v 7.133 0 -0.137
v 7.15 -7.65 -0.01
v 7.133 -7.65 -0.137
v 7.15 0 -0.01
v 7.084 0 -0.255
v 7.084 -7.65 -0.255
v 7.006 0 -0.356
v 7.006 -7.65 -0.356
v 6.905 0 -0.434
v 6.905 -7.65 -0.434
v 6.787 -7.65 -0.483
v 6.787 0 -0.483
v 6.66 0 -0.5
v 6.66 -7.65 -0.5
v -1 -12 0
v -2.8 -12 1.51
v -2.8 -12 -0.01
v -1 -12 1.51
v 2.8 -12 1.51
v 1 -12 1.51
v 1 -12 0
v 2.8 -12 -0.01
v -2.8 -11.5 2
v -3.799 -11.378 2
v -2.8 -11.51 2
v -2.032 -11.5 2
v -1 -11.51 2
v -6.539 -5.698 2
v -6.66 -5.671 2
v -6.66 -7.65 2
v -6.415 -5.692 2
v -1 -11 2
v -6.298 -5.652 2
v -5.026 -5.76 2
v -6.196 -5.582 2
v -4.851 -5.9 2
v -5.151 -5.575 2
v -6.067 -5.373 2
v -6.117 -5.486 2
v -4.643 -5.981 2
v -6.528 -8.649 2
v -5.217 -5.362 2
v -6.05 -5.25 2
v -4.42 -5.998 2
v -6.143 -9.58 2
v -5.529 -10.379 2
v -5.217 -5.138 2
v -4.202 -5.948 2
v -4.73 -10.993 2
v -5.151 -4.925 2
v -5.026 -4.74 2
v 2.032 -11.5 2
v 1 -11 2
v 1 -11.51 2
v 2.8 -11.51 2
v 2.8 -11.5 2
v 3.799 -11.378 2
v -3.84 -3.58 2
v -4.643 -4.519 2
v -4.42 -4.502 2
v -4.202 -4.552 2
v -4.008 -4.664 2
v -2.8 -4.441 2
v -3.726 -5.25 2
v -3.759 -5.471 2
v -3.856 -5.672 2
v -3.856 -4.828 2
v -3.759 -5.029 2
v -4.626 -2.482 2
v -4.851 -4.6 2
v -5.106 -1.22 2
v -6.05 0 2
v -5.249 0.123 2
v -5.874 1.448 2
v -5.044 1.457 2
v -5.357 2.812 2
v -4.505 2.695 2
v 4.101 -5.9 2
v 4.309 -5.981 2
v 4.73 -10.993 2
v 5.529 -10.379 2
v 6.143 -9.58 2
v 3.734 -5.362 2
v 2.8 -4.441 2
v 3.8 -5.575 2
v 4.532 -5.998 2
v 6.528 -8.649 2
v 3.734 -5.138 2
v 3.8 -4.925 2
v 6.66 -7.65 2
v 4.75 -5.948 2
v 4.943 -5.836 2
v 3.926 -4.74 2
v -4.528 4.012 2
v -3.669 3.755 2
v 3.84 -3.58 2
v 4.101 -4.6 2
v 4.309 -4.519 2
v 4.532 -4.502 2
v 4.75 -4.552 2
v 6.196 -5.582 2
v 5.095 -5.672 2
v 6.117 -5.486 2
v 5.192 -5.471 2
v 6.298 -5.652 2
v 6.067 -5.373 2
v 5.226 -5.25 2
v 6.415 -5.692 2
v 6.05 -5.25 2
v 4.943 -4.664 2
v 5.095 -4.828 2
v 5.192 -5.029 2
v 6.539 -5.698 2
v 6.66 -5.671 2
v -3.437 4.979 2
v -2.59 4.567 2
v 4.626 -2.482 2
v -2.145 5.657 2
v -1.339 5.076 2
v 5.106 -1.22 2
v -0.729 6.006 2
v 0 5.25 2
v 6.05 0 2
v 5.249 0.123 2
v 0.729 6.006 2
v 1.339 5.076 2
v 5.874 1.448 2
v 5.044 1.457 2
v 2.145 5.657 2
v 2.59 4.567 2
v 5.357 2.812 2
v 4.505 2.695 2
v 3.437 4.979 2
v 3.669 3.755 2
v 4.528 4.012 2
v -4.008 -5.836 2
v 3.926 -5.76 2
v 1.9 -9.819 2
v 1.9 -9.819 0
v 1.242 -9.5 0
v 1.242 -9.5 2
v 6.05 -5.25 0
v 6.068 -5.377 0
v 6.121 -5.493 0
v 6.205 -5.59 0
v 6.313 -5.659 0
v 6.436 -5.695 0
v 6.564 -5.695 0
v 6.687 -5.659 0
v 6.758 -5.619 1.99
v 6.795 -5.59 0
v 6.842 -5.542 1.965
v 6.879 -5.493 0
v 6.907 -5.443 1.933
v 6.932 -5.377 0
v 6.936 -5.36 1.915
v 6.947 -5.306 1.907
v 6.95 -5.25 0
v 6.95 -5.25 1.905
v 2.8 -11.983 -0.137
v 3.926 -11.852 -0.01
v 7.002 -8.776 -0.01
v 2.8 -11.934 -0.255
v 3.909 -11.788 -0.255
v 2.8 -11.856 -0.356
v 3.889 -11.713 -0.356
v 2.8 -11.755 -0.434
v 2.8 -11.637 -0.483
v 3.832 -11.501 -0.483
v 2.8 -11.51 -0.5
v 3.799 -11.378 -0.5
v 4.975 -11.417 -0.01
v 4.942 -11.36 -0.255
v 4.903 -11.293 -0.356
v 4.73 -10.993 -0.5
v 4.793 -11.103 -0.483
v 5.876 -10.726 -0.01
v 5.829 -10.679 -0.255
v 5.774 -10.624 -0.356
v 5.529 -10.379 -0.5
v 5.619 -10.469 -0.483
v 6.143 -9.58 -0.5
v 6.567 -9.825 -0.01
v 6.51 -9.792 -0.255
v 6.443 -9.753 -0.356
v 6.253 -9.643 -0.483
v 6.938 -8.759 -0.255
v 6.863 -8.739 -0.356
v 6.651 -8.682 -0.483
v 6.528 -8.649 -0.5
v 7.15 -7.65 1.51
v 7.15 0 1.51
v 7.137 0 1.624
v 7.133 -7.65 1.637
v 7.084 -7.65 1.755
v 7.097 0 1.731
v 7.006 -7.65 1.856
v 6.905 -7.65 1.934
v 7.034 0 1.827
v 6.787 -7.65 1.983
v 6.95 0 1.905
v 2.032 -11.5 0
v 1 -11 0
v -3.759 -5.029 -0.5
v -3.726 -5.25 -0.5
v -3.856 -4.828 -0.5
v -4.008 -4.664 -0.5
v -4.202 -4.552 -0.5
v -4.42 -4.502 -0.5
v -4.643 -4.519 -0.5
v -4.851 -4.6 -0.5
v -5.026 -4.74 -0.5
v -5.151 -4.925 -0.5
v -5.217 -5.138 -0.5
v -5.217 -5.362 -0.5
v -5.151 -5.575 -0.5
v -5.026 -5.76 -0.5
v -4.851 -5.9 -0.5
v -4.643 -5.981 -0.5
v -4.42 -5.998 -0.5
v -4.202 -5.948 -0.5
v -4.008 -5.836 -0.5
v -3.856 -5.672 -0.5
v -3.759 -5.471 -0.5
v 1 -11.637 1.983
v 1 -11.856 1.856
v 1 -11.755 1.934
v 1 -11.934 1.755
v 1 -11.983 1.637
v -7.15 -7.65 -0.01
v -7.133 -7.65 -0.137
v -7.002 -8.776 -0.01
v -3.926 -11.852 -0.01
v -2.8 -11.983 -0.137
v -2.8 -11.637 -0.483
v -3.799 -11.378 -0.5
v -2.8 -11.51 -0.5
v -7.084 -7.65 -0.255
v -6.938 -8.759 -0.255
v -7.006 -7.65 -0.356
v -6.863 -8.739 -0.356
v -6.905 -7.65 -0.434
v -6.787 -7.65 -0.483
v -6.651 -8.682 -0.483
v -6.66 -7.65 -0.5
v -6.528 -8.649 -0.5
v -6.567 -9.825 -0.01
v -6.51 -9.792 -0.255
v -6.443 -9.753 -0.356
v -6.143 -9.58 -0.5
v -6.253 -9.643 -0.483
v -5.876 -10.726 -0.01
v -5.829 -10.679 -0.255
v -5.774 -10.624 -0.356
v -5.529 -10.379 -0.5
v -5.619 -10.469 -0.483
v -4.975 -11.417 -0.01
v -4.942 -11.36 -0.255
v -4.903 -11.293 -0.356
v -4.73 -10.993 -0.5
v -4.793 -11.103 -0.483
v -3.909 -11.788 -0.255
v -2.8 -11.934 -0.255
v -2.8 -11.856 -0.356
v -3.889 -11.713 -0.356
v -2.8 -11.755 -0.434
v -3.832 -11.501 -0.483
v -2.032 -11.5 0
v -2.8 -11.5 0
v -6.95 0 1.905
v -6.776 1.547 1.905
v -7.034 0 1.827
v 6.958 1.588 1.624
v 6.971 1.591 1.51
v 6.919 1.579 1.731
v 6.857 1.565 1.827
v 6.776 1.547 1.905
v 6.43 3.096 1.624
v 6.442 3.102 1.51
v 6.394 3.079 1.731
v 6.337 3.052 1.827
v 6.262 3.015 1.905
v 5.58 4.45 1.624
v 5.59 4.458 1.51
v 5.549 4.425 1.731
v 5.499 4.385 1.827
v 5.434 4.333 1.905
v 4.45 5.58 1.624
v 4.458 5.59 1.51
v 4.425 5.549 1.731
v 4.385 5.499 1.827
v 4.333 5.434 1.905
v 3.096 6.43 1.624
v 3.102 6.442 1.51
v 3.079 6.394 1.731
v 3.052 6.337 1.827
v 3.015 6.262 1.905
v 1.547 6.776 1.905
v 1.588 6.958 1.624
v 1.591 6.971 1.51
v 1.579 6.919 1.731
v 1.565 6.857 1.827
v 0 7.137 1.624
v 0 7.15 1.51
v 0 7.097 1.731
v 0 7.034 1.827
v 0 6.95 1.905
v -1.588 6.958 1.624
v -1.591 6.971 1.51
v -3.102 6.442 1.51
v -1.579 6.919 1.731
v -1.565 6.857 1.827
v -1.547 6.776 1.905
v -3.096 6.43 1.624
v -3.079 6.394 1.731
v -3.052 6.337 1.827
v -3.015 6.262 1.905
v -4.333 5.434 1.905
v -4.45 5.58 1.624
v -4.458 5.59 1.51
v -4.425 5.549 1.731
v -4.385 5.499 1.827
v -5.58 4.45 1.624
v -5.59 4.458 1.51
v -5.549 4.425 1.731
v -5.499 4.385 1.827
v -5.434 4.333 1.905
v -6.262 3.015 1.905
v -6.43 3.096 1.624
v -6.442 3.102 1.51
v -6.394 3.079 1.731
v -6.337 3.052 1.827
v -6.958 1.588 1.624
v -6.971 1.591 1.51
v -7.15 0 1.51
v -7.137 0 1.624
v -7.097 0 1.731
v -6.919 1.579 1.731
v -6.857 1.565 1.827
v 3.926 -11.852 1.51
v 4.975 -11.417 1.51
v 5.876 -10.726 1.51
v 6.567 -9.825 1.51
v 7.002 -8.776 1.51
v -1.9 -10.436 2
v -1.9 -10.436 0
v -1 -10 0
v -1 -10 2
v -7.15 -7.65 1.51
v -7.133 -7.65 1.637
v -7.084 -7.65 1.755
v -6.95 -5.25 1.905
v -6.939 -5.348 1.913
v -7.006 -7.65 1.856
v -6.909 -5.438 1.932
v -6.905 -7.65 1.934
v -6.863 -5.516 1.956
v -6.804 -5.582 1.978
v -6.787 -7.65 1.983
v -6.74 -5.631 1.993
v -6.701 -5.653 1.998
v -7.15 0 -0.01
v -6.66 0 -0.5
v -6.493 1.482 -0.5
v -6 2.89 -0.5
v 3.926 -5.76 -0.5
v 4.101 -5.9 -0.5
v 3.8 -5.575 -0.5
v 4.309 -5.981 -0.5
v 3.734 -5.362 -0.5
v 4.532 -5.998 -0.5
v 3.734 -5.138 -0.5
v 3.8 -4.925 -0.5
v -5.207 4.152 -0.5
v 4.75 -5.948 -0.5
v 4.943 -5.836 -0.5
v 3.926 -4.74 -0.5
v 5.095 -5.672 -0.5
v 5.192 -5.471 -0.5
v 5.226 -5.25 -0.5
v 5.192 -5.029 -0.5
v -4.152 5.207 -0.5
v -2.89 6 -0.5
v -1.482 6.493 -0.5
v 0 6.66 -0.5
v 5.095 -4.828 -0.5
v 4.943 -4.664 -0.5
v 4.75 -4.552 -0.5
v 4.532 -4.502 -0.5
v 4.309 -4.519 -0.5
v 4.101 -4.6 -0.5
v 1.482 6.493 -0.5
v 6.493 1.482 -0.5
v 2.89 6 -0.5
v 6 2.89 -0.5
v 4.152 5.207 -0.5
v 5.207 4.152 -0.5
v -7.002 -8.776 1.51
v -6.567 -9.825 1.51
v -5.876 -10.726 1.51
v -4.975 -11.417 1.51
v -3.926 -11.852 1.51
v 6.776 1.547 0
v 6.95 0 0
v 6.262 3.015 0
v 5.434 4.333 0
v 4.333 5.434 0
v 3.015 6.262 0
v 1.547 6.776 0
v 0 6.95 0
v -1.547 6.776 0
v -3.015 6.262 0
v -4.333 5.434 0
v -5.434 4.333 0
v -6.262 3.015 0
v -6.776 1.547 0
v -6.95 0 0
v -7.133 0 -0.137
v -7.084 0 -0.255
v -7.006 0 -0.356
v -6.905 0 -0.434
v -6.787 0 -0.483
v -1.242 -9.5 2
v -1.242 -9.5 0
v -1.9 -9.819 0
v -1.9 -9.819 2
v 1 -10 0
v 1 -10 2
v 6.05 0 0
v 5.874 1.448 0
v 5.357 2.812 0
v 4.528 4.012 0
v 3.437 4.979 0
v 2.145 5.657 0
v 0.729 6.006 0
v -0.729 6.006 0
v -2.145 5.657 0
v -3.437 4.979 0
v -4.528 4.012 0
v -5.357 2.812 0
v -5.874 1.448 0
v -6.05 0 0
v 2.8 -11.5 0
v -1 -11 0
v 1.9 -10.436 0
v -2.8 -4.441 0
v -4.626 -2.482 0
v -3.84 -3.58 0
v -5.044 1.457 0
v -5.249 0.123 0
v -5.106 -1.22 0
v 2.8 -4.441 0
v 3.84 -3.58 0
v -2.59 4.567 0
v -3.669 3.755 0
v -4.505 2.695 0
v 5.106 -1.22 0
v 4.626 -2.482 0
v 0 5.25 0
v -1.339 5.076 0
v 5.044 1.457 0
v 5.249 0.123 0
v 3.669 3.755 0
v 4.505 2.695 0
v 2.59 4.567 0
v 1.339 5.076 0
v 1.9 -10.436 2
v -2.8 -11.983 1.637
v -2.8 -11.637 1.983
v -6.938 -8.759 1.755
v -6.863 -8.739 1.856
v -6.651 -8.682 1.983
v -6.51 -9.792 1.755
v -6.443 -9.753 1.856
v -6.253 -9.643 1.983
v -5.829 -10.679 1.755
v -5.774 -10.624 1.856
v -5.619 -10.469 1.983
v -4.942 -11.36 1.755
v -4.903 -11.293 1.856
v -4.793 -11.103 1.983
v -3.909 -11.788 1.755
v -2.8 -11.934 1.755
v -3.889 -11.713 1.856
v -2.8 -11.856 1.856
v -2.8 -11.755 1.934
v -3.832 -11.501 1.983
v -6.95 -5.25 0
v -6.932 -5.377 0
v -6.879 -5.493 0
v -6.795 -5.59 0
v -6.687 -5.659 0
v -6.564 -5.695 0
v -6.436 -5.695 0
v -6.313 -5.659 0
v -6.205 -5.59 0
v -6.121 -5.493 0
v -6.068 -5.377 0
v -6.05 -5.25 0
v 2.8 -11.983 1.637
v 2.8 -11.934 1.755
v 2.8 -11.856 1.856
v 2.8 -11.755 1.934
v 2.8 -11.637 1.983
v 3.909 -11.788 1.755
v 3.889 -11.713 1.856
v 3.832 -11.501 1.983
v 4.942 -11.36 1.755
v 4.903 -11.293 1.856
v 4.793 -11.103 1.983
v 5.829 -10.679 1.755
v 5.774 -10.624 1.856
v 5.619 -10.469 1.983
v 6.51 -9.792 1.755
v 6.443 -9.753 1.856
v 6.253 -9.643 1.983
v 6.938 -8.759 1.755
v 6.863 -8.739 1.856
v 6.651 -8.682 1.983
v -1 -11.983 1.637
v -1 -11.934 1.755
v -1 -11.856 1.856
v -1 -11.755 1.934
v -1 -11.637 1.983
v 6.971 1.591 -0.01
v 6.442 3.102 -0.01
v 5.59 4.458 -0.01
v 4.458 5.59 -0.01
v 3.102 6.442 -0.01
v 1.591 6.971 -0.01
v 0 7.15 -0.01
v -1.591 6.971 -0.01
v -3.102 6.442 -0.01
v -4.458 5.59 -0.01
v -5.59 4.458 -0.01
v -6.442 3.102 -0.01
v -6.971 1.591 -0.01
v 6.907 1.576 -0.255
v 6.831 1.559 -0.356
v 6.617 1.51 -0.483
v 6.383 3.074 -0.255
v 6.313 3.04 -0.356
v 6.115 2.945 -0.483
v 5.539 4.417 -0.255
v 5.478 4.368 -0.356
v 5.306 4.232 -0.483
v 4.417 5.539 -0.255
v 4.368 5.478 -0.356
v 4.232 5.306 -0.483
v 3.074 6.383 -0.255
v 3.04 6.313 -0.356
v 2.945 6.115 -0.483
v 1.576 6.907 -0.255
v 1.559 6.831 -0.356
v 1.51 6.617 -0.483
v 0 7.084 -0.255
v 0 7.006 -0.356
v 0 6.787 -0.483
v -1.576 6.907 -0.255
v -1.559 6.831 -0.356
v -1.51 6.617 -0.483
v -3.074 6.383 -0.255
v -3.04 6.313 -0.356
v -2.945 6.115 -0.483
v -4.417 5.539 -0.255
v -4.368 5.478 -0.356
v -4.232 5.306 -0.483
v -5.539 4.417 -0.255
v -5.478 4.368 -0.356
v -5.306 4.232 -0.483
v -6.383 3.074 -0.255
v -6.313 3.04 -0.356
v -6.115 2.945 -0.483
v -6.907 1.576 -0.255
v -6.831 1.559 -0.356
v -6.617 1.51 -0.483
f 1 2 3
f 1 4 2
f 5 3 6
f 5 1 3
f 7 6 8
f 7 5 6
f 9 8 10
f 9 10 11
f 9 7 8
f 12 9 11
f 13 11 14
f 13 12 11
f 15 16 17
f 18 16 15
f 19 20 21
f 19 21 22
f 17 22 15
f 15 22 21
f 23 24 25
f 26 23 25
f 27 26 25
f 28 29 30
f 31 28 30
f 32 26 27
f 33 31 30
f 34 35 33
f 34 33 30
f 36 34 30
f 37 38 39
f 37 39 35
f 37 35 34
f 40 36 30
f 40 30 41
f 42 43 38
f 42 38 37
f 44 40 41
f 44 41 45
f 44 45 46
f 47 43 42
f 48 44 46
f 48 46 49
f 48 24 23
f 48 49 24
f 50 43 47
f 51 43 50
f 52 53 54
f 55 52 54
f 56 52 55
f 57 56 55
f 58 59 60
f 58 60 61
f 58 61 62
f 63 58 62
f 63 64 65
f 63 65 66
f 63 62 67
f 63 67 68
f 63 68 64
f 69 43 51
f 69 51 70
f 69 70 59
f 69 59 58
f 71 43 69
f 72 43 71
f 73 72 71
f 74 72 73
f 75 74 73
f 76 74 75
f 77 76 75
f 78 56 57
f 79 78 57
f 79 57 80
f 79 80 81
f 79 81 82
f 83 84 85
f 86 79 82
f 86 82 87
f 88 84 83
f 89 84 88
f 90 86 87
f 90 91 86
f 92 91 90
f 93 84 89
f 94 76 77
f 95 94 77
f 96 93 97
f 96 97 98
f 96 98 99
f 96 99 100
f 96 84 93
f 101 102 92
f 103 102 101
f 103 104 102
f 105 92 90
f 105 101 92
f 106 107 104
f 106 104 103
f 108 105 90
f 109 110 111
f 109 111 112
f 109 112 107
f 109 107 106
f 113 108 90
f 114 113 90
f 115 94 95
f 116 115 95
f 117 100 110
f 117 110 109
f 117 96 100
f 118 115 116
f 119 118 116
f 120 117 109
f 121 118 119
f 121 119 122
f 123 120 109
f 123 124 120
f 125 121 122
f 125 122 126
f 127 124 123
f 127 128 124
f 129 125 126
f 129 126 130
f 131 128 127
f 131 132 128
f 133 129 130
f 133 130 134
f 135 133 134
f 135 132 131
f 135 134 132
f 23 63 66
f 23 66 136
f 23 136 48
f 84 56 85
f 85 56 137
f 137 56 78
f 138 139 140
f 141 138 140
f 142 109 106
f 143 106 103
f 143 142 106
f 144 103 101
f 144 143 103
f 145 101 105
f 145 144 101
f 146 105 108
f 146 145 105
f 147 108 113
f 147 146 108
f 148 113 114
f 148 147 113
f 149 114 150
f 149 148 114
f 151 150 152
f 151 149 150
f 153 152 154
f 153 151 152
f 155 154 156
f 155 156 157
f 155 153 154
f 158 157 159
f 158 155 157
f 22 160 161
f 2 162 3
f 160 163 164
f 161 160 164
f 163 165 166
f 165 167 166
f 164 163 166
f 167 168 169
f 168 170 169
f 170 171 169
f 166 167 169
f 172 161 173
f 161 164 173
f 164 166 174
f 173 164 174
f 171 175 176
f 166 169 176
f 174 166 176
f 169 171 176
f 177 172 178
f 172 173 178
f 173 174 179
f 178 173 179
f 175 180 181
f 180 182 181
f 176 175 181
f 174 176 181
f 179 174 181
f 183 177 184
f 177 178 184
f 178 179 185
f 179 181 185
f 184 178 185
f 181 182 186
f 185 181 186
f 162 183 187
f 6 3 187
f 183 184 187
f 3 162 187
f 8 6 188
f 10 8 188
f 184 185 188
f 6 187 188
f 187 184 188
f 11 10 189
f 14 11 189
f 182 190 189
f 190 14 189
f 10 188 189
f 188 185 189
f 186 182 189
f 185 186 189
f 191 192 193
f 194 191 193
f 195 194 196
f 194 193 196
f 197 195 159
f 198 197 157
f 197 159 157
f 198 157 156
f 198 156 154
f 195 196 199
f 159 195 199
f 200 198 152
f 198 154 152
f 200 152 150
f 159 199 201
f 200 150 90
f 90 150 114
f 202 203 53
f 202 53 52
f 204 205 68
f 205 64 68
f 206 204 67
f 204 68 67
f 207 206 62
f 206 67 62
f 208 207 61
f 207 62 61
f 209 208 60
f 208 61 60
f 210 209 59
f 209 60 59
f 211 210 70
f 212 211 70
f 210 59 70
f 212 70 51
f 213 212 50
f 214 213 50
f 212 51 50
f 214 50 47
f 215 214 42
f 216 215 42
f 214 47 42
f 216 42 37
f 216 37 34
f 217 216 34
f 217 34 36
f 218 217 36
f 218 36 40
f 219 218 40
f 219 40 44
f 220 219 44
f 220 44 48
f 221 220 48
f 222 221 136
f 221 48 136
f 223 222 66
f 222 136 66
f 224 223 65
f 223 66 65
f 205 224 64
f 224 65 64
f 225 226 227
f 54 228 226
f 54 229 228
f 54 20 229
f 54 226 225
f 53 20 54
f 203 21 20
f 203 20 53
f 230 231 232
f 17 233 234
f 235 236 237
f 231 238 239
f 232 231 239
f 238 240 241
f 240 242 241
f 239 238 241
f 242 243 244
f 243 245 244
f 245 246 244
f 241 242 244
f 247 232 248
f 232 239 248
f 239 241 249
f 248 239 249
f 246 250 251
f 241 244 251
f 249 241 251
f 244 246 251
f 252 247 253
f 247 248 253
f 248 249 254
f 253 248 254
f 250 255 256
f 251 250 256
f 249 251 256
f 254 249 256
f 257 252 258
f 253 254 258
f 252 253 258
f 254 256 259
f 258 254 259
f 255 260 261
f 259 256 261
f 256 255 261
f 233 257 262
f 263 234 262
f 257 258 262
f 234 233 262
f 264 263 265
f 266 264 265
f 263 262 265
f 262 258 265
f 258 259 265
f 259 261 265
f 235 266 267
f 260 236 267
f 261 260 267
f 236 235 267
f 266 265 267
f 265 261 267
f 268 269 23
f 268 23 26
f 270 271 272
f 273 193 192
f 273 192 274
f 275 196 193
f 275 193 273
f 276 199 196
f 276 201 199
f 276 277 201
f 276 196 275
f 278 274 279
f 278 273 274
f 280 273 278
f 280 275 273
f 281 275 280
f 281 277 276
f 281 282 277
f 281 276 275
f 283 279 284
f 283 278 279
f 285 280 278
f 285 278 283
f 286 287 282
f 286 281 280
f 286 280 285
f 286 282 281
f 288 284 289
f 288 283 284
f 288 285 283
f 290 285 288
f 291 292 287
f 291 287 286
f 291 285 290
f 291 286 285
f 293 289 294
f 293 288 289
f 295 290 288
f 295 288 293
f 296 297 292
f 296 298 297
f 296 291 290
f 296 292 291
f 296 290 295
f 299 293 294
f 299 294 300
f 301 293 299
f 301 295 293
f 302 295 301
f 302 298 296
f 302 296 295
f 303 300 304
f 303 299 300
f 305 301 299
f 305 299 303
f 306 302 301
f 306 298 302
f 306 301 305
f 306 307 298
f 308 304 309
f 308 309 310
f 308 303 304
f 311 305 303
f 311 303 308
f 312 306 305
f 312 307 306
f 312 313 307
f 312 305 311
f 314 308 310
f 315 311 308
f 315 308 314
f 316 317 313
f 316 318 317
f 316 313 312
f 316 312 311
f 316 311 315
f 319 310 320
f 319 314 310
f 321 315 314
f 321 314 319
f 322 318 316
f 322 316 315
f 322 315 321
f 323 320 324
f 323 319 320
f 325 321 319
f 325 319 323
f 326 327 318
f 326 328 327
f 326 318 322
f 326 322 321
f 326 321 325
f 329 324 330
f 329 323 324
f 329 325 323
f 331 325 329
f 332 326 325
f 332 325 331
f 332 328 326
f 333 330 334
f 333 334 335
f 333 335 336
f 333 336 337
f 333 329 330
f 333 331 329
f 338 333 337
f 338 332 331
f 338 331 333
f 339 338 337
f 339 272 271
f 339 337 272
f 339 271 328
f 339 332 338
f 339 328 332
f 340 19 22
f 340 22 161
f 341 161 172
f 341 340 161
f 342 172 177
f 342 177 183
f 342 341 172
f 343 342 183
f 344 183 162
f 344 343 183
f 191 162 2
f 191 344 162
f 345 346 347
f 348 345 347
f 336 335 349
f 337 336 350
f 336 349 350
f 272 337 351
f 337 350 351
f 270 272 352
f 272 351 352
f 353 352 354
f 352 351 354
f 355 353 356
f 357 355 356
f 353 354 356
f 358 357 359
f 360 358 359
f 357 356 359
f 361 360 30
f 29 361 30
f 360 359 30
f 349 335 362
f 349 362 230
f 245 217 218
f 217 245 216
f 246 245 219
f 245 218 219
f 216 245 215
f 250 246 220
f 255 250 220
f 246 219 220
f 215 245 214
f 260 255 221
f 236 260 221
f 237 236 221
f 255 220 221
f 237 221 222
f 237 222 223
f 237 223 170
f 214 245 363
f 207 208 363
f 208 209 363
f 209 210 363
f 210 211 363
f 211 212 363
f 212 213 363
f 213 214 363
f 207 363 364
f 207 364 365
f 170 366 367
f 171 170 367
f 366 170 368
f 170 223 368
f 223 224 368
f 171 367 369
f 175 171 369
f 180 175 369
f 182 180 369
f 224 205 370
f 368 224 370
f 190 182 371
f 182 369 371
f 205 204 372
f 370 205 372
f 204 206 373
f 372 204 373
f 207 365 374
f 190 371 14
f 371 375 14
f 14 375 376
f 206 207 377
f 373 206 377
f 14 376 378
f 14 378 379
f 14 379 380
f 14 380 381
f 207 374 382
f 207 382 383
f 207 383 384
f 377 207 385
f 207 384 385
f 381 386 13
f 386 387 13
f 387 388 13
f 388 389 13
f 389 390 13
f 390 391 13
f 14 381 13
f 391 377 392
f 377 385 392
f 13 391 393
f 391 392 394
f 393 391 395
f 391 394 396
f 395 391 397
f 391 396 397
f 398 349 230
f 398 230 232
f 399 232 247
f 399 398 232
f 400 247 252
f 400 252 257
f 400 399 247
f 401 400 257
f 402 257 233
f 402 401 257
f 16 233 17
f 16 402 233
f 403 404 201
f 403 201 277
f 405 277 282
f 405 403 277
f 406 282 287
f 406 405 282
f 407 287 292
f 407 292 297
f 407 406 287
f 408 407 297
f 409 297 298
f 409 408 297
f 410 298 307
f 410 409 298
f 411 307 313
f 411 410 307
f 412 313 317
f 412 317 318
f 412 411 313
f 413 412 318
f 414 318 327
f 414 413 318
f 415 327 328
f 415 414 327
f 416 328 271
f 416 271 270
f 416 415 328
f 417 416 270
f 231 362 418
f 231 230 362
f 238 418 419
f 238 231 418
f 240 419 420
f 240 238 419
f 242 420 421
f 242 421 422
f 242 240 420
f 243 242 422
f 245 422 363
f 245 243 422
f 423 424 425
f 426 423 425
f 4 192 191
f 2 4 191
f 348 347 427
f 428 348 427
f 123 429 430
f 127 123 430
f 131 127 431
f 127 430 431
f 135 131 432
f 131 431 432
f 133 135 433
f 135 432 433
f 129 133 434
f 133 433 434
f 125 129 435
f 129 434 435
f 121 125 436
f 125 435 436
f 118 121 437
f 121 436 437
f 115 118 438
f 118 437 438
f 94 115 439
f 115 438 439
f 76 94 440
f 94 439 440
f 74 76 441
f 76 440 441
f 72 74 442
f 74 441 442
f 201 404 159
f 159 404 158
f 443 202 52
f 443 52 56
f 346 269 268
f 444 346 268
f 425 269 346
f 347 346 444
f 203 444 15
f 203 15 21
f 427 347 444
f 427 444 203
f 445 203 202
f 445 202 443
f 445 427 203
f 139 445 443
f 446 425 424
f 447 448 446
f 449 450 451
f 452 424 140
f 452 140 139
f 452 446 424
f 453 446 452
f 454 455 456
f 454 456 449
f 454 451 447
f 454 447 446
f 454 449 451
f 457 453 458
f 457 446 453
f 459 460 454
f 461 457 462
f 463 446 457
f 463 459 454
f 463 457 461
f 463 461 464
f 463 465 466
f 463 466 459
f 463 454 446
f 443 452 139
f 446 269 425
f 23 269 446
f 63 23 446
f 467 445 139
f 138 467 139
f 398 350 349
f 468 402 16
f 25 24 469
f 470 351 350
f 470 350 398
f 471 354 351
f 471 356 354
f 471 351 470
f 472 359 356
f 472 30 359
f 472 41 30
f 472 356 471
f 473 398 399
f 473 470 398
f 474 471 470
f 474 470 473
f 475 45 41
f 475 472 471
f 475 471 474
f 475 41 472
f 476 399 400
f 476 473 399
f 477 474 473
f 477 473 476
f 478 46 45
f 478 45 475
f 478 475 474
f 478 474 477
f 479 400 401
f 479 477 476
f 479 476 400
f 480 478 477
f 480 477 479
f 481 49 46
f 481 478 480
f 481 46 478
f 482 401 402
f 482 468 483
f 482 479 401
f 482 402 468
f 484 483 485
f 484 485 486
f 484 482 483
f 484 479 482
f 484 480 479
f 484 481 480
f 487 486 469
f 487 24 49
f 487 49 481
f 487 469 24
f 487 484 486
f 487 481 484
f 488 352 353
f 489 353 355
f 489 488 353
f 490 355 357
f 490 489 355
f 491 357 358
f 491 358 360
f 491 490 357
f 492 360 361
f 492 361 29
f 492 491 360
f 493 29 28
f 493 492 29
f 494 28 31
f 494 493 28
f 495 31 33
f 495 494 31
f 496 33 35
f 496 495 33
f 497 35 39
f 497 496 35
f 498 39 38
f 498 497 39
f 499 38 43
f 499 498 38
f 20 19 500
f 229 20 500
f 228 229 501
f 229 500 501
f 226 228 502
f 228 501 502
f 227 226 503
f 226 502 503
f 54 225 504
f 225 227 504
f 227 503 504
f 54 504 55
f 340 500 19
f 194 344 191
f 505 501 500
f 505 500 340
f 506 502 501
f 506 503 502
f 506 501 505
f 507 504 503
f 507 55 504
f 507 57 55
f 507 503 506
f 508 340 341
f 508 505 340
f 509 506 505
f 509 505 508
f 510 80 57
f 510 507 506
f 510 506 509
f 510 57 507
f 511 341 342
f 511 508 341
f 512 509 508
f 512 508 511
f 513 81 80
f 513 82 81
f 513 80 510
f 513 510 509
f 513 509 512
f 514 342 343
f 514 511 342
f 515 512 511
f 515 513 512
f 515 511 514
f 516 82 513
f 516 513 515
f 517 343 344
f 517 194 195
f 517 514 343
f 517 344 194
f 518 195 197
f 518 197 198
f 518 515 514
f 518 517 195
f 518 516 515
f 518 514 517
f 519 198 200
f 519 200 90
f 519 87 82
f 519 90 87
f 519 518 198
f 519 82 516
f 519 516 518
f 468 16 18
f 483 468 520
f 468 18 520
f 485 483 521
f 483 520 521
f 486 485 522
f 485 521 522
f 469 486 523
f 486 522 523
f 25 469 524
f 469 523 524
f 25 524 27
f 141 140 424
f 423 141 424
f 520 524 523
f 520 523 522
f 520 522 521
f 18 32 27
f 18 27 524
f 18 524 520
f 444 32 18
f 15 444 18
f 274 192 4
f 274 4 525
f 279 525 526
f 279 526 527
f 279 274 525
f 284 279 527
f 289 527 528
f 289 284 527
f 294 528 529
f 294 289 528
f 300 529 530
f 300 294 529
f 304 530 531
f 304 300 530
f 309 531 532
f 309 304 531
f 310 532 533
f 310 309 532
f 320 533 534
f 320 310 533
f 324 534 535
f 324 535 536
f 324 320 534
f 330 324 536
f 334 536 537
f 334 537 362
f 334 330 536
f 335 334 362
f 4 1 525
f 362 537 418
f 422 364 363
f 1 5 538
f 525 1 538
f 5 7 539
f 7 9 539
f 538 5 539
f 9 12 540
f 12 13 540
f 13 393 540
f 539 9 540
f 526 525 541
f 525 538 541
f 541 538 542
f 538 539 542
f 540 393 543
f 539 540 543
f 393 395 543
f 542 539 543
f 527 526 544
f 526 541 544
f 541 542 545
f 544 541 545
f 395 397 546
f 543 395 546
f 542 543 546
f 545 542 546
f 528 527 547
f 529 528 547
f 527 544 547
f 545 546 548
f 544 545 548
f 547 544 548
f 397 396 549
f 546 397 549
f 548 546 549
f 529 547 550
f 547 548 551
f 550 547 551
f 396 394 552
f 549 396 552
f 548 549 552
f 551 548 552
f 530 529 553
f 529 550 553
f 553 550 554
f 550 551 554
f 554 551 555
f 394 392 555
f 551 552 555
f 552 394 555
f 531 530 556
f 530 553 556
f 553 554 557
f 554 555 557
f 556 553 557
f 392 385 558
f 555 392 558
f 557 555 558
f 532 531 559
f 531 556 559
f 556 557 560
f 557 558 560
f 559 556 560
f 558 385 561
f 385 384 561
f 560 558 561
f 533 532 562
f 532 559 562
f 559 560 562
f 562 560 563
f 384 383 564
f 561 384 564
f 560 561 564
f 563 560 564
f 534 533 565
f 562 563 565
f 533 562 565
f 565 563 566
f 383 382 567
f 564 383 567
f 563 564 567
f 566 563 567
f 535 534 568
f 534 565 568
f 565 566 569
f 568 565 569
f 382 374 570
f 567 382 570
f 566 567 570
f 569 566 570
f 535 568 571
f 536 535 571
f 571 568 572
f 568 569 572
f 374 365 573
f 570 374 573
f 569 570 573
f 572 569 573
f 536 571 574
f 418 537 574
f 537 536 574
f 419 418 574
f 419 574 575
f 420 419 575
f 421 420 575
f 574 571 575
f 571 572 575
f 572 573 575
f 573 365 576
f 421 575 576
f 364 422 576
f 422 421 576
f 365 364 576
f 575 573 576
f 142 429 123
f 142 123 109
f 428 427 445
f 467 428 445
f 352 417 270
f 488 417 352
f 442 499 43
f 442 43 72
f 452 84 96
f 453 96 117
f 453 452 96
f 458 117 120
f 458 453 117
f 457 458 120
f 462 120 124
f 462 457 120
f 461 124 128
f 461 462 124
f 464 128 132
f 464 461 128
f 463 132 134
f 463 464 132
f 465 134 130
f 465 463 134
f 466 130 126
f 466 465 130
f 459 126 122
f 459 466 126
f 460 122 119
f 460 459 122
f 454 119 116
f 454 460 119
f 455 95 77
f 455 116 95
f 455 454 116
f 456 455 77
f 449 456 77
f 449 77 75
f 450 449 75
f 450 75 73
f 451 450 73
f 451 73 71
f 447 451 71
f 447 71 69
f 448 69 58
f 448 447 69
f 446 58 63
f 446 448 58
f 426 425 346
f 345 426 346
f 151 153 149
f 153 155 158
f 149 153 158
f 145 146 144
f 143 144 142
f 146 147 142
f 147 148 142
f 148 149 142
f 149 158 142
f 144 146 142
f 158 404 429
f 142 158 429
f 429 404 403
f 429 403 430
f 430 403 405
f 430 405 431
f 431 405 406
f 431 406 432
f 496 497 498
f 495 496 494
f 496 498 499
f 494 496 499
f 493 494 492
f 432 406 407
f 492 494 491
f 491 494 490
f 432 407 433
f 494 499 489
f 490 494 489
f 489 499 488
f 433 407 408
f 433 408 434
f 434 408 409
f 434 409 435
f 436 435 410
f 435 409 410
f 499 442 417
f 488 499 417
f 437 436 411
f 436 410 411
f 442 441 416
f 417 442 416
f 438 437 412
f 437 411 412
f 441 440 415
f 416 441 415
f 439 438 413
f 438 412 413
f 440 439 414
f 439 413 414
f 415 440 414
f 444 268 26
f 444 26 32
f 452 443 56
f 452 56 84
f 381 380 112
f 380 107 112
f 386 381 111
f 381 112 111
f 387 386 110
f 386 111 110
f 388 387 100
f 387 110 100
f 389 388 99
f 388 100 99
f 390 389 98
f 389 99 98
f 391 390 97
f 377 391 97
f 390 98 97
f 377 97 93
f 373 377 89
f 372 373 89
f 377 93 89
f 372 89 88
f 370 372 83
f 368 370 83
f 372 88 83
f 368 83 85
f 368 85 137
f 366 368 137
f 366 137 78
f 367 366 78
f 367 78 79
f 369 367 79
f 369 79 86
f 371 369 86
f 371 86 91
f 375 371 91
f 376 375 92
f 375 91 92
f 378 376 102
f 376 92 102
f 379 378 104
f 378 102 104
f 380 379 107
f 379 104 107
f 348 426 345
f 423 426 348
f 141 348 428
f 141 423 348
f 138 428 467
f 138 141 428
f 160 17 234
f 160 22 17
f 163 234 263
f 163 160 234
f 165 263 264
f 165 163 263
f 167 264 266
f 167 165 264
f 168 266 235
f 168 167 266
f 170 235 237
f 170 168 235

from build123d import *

# Parameters (mm, degrees)
PAD020_DEPTH         = 2
PAD020_DEPTH_BACK    = 0.5
FILLET003_R          = 0.49
POCKET007_DEPTH      = 2.001
SKETCH044_R          = 0.75
POCKET008_DEPTH      = 2.0010001
POCKET008_DEPTH_BACK = 0.501


with BuildPart() as part:
    # Sketch040 → Pad020 (new body, two sides)
    with BuildSketch(Plane.XY) as pad020_sk:
        with BuildLine():
            ThreePointArc((7.15, 0), (0, 7.15), (-7.15, 0))
            Line((-7.15, 0), (-7.15, -7.65))
            ThreePointArc((-7.15, -7.65), (-5.8759144982, -10.7259144982), (-2.8, -12))
            Line((-2.8, -12), (2.8, -12))
            ThreePointArc((2.8, -12), (5.8759144982, -10.7259144982), (7.15, -7.65))
            Line((7.15, 0), (7.15, -7.65))
        make_face()
    extrude(amount=PAD020_DEPTH)
    extrude(pad020_sk.sketch, amount=-PAD020_DEPTH_BACK)

    # Fillet003
    fillet003_edges = [part.edges().sort_by_distance(p)[0] for p in [
        (0, 7.15, -0.5),
        (-7.15, -3.825, -0.5),
        (-5.875914, -10.725914, -0.5),
        (0, -12, -0.5),
        (5.875914, -10.725914, -0.5),
        (7.15, -3.825, -0.5),
        (0, 7.15, 2),
        (-7.15, -3.825, 2),
        (-5.875914, -10.725914, 2),
        (0, -12, 2),
        (5.875914, -10.725914, 2),
        (7.15, -3.825, 2),
    ]]
    fillet(fillet003_edges, radius=FILLET003_R)

    # Sketch043 → Pocket007 (cut, through all)
    with BuildSketch(Plane.XY):
        with BuildLine():
            Line((1, -12), (1, -11))
            Line((1, -11), (2.0323708024, -11.5))
            Line((2.0323708024, -11.5), (2.8, -11.5))
            Line((2.8, -11.5), (2.8, -4.4410021392))
            ThreePointArc((2.8, -4.4410021392), (0, 5.25), (-2.8, -4.4410021392))
            Line((-2.8, -11.5), (-2.8, -4.4410021392))
            Line((-2.8, -11.5), (-2.0323708024, -11.5))
            Line((-2.0323708024, -11.5), (-1, -11))
            Line((-1, -11), (-1, -12))
            Line((-1, -12), (1, -12))
        make_face()
        Polygon((1.2421610524, -9.5), (-1.2421610524, -9.5), (-1.9, -9.8186059437), (-1.9, -10.4358898944), (-1, -10), (1, -10), (1.9, -10.4358898944), (1.9, -9.8186059437), align=None, mode=Mode.SUBTRACT)
        with BuildLine():
            ThreePointArc((6.05, 0), (0, 6.05), (-6.05, 0))
            Line((-6.05, -5.25), (-6.05, 0))
            ThreePointArc((-6.95, -5.25), (-6.5, -5.7), (-6.05, -5.25))
            Line((-6.95, 0), (-6.95, -5.25))
            ThreePointArc((6.95, 0), (0, 6.95), (-6.95, 0))
            Line((6.95, 0), (6.95, -5.25))
            ThreePointArc((6.05, -5.25), (6.5, -5.7), (6.95, -5.25))
            Line((6.05, 0), (6.05, -5.25))
        make_face()
    extrude(amount=POCKET007_DEPTH, mode=Mode.SUBTRACT)

    # Sketch044 → Pocket008 (cut, two sides)
    with BuildSketch(Plane.XY) as pocket008_sk:
        with Locations((4.475757, -5.25)):
            Circle(SKETCH044_R)
        with Locations((-4.475757, -5.25)):
            Circle(SKETCH044_R)
    extrude(amount=POCKET008_DEPTH, mode=Mode.SUBTRACT)
    extrude(pocket008_sk.sketch, amount=-POCKET008_DEPTH_BACK, mode=Mode.SUBTRACT)


solid = part.part
